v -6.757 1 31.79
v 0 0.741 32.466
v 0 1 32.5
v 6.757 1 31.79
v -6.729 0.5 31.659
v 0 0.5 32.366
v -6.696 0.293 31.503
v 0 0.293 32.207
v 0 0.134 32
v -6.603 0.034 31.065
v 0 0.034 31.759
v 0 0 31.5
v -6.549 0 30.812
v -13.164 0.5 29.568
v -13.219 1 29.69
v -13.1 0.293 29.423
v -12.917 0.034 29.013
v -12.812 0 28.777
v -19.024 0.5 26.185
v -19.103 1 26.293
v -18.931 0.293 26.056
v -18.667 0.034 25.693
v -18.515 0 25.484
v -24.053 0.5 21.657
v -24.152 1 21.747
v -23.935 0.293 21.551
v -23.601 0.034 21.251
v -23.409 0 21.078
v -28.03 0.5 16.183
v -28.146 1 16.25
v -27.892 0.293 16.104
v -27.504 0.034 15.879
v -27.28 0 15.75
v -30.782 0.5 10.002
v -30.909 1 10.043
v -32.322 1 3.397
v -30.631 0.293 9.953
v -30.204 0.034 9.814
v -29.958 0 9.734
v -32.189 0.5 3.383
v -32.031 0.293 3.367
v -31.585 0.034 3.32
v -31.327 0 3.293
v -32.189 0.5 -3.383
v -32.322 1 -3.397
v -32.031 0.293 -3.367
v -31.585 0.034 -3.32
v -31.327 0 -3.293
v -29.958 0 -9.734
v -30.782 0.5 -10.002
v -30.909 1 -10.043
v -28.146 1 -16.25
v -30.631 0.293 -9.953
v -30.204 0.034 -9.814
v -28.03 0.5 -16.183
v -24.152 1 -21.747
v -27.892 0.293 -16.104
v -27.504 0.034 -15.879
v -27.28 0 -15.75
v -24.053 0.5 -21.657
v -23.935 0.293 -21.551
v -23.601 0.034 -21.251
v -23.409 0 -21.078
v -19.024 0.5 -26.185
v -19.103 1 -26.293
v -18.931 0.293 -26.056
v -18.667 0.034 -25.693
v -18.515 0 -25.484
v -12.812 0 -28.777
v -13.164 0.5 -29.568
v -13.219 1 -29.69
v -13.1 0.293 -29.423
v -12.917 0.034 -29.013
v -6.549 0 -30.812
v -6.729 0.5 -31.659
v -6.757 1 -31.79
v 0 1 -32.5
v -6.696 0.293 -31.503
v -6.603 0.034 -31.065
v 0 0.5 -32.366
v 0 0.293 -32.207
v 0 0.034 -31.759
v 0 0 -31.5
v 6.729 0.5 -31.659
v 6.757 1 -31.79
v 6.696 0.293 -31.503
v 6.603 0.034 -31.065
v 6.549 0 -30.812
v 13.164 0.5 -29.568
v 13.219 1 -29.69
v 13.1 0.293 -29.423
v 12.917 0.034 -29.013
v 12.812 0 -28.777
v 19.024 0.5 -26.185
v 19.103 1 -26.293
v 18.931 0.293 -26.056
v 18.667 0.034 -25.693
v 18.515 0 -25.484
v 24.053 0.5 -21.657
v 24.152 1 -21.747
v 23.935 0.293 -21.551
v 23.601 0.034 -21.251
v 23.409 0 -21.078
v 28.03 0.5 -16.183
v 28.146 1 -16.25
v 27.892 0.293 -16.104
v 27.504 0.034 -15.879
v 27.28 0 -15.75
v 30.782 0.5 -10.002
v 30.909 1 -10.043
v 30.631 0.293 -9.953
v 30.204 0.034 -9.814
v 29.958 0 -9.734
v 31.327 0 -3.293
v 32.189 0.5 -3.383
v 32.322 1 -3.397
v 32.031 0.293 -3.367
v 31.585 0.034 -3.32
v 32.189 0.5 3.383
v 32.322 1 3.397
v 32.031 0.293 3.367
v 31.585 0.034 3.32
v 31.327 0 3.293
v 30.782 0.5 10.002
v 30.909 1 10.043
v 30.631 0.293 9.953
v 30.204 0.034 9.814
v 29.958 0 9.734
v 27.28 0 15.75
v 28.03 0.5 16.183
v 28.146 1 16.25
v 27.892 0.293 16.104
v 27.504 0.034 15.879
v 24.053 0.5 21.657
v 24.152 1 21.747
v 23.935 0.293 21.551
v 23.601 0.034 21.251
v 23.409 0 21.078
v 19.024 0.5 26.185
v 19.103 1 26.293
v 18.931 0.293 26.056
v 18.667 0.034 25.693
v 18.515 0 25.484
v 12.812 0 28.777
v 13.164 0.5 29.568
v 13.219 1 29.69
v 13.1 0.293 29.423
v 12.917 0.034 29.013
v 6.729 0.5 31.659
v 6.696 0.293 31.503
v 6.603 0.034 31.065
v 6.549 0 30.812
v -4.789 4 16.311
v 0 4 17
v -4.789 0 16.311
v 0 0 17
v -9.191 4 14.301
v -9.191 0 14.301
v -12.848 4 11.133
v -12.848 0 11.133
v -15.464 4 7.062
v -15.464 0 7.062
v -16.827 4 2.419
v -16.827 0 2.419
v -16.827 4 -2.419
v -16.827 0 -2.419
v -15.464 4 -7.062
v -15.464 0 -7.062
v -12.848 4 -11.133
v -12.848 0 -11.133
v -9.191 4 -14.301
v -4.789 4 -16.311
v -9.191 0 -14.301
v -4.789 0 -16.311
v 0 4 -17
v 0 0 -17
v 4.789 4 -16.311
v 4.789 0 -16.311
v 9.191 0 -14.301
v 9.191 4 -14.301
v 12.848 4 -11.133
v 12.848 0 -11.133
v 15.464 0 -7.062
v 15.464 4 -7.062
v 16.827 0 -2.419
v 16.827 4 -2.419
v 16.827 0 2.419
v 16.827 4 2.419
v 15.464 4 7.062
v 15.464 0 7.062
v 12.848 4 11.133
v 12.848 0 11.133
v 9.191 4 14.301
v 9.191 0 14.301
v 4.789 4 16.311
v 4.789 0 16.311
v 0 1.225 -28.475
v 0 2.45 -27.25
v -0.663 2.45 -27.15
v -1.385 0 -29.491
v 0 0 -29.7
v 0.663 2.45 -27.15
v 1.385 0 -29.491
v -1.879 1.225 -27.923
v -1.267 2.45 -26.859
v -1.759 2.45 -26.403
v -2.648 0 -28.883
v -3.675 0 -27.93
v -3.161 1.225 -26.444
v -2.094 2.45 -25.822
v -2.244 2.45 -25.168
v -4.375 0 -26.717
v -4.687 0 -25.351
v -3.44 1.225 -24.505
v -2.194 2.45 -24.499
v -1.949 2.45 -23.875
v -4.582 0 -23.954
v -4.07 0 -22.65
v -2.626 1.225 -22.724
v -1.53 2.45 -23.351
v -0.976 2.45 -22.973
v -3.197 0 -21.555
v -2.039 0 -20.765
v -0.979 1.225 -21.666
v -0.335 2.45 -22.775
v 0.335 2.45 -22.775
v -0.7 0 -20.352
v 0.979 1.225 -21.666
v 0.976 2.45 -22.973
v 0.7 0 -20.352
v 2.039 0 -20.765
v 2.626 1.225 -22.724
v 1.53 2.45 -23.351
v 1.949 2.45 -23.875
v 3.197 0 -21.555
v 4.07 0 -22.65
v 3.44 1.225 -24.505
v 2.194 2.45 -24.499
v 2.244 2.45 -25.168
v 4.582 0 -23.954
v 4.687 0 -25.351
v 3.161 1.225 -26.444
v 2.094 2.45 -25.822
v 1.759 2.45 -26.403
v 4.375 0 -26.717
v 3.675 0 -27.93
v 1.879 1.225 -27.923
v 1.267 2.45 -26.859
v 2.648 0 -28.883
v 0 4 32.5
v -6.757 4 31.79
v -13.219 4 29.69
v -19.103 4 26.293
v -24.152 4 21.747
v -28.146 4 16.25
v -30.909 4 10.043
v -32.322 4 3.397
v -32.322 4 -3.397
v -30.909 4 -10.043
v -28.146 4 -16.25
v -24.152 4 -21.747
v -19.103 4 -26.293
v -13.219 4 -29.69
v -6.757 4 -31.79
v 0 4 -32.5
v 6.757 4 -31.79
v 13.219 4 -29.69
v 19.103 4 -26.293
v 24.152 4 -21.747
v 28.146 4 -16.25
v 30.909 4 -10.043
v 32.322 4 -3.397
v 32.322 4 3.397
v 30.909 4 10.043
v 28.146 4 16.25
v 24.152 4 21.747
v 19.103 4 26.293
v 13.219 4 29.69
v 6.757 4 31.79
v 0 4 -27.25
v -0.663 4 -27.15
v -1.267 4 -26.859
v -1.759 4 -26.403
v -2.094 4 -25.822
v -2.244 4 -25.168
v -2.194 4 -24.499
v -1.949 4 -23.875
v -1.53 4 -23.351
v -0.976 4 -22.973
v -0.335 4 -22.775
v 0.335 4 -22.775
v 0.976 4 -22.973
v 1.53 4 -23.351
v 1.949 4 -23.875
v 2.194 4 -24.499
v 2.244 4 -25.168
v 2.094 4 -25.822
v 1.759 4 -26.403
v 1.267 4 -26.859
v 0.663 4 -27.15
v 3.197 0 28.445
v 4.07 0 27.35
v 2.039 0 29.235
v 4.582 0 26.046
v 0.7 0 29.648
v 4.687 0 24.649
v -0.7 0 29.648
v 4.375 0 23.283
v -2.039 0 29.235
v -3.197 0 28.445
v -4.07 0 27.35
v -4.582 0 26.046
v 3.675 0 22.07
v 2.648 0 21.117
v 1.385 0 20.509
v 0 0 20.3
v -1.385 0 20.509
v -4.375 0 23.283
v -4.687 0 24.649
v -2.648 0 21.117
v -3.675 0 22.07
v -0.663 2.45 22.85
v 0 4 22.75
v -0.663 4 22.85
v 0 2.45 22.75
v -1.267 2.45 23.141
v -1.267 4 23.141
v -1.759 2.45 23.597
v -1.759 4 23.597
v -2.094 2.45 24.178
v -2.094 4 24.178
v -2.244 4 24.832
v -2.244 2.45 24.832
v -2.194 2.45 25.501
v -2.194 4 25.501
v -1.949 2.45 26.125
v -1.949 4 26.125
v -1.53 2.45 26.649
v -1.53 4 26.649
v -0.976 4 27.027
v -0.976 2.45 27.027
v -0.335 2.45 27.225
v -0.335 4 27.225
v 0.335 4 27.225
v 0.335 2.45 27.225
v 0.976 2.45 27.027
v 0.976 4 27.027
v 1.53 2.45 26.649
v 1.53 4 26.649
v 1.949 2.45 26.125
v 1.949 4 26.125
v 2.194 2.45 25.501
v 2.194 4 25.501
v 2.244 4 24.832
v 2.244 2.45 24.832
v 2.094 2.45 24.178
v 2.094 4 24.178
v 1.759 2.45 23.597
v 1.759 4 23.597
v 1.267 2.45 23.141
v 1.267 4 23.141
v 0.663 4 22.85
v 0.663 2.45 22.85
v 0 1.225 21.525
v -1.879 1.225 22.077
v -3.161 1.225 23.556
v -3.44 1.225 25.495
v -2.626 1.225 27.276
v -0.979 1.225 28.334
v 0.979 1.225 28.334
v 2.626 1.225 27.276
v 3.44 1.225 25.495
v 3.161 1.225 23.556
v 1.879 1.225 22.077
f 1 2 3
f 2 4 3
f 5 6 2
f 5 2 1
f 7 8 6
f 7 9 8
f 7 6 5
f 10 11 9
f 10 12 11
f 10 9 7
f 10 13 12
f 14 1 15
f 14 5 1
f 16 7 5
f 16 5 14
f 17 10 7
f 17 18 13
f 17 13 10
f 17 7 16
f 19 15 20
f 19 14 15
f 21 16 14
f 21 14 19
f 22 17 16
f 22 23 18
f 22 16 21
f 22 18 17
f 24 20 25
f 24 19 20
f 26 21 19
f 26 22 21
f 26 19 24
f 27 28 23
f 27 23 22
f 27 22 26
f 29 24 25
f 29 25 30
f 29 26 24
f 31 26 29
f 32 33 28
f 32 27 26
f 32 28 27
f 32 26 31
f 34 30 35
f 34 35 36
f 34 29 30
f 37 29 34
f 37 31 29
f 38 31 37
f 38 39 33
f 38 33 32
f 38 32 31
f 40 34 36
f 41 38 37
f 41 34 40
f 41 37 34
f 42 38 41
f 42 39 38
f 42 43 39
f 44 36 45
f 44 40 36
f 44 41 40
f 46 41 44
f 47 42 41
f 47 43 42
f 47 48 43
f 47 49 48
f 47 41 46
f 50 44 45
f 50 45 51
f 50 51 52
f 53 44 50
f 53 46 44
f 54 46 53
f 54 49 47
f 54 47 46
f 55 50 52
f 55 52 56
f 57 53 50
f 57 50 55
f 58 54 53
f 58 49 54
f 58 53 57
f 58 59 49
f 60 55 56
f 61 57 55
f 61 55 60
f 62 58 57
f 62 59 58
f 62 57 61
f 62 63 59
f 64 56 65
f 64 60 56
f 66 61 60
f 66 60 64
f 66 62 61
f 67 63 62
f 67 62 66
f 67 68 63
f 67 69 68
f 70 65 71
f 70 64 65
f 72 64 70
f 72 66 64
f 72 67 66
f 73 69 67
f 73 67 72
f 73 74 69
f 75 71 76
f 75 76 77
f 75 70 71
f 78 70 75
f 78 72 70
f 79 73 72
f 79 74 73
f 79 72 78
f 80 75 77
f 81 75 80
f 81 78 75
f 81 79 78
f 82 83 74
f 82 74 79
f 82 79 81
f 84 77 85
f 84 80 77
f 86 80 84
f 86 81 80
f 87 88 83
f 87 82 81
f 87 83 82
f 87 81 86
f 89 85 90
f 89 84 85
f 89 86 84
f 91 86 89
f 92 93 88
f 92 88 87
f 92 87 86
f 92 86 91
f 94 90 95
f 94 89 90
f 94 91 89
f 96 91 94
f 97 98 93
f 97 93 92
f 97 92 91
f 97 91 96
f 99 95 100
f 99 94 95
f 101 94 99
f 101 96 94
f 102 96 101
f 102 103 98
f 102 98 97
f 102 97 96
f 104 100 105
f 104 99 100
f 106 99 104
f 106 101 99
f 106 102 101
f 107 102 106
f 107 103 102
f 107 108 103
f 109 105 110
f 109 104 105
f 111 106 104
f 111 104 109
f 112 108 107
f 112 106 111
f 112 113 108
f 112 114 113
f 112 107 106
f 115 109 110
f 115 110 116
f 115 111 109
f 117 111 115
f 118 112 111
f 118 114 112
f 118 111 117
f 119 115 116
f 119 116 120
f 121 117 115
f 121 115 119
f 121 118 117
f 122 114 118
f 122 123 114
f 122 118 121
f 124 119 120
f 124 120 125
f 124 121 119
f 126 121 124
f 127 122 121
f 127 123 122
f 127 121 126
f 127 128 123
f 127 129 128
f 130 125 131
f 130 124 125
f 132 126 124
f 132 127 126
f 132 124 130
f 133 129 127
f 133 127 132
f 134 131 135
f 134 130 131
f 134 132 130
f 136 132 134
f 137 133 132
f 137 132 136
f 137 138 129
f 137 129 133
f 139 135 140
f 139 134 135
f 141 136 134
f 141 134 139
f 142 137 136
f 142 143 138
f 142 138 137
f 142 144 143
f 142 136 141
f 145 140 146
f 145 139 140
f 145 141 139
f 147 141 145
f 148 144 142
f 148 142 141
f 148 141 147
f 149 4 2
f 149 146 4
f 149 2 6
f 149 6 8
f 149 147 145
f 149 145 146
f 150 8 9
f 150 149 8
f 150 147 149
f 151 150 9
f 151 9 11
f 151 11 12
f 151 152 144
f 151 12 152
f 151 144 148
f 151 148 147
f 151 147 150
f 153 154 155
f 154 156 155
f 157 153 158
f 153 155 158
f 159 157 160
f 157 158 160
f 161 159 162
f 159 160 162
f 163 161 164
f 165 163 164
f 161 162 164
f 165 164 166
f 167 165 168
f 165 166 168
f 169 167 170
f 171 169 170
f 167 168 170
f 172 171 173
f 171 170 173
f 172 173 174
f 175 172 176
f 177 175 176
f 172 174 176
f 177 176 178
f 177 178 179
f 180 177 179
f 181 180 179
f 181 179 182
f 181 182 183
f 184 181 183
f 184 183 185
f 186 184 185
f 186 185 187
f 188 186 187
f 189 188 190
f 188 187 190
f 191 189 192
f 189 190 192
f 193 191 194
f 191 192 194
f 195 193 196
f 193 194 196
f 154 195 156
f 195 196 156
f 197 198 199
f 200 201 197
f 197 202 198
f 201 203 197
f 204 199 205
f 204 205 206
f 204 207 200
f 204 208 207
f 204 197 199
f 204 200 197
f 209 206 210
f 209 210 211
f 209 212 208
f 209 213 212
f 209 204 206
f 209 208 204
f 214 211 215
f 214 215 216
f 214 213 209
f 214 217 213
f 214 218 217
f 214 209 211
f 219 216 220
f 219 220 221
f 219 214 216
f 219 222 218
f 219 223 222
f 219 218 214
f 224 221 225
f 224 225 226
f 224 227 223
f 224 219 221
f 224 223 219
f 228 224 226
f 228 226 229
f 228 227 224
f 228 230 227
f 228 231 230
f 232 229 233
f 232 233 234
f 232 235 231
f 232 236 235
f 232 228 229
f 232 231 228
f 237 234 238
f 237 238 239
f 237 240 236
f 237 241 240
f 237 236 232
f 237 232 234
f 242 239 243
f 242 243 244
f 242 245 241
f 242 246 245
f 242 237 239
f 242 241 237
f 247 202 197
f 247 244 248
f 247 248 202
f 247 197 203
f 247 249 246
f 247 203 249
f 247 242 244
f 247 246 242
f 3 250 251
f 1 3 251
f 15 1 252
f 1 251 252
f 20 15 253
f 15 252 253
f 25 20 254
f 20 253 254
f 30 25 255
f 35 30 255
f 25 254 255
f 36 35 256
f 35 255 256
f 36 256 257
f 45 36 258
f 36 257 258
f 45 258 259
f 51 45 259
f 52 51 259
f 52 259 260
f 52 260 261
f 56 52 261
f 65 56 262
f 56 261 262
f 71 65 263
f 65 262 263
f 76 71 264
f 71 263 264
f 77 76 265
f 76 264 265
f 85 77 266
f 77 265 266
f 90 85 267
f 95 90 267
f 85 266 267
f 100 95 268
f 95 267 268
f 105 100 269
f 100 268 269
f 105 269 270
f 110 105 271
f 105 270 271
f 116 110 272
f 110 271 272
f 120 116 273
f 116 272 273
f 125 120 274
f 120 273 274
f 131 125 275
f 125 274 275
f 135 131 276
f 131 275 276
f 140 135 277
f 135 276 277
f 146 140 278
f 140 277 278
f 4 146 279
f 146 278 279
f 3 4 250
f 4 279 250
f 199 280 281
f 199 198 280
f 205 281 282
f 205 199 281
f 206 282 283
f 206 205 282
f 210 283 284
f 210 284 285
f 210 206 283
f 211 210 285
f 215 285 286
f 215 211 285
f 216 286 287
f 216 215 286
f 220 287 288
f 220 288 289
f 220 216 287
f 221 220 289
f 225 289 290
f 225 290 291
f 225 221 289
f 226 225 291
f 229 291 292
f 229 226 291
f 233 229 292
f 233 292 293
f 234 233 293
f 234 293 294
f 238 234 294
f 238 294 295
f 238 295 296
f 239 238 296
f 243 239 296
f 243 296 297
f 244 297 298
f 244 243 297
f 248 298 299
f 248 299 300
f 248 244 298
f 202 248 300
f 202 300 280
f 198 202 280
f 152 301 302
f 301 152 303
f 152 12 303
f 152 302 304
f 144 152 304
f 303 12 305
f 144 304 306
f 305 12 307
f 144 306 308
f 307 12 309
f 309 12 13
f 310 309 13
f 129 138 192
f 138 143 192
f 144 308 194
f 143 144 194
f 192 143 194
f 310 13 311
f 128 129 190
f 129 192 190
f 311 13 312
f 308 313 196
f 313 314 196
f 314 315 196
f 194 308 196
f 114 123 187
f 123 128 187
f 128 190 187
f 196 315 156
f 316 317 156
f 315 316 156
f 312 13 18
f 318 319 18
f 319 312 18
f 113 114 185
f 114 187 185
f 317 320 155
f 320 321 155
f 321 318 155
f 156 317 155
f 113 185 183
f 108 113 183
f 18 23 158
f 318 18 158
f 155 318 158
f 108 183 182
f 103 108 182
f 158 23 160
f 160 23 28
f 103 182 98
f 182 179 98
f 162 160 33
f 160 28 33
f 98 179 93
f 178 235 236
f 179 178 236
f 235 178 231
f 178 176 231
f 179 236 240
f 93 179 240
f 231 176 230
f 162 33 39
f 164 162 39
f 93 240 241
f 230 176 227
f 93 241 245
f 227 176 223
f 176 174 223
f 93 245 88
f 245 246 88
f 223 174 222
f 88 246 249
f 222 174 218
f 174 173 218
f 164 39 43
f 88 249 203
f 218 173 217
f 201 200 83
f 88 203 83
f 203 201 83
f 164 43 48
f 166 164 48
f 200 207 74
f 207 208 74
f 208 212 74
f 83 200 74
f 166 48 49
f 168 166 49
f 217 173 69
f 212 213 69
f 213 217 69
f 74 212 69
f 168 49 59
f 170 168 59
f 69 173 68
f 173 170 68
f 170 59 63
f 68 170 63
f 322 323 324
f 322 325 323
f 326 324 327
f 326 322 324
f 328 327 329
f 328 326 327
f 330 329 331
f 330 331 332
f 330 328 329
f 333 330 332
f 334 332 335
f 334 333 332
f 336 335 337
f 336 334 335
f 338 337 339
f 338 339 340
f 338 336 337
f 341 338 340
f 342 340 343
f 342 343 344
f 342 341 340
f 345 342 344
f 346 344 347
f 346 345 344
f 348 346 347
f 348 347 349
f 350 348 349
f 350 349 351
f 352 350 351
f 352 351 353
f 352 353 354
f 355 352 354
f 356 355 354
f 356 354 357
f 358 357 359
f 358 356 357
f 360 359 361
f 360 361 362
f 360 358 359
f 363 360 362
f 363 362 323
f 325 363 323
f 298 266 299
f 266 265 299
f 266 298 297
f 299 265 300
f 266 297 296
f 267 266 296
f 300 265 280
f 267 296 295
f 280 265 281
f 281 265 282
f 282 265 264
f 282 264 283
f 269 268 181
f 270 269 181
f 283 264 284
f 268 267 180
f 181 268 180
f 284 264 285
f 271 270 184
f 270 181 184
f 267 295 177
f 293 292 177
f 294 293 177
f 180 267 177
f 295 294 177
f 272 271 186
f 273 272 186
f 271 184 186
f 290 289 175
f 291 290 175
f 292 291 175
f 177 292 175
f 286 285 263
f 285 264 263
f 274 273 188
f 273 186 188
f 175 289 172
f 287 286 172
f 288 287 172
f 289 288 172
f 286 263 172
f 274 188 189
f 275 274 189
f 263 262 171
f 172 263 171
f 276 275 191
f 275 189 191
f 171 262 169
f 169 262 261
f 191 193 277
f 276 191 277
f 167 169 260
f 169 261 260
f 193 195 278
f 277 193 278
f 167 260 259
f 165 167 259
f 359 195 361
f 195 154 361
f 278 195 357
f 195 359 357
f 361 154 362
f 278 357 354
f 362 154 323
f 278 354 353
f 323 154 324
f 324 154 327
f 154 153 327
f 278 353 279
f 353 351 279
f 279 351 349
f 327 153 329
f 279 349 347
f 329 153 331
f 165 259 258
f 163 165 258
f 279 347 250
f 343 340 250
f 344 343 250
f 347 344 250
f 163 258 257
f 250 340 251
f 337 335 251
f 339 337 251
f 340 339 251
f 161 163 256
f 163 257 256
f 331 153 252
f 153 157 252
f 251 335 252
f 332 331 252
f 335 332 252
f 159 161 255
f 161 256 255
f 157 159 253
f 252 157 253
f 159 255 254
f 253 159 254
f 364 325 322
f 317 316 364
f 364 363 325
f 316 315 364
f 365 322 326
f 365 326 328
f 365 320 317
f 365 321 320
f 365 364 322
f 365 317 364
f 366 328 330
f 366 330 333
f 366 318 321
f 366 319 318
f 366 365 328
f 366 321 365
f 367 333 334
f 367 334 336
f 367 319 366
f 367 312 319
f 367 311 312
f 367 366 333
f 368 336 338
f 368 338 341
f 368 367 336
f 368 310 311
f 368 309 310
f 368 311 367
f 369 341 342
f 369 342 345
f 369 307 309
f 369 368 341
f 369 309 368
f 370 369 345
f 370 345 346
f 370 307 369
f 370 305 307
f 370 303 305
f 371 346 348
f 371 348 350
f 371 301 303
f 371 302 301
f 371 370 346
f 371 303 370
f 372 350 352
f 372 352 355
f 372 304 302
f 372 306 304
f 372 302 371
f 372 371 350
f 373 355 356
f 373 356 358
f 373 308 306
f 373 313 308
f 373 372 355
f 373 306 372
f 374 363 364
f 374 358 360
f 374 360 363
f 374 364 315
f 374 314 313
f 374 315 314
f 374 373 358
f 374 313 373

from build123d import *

# Parameters (mm, degrees)
CSK_SLOT_FOR_M4_COUNTERSUNK_FLAT_HEA_2_COUNT = 2
CSK_SLOT_FOR_M4_COUNTERSUNK_FLAT_HEA_2_PITCH = 50
FILLET1_R                                    = 1
CUT_EXTRUDE2_START                           = -10
SKETCH5_R                                    = 17
CUT_EXTRUDE2_DEPTH                           = 10


with BuildPart() as part:
    # Sketch1 → Revolve1 (revolve)
    with BuildSketch(Plane.XY, mode=Mode.PRIVATE) as revolve1_sk:
        Polygon((-32.5, 0), (-32.5, 4), (-17, 4), (-17, 2), (0, 2), (0, 0), align=None)
    revolve(revolve1_sk.sketch.rotate(Axis((0, 0, 0), (0, -1, 0)), 270), axis=Axis((0, 0, 0), (0, -1, 0)))

    # Sketch3 → CSK SLOT for M4 Countersunk Flat Head Screw1 (revolve, cut)
    with BuildSketch(Plane(origin=(0, 0, 25), x_dir=(0, 0, -1), z_dir=(1, 0, 0))):
        Polygon((0, 0), (0, 4), (2.25, 4), (2.25, 2.45), (4.7, 0), align=None)
    csk_slot_for_m4_countersunk_flat_head_sc = revolve(axis=Axis((0, -6.35, 25), (0, 1, 0)), mode=Mode.SUBTRACT)

    # CSK SLOT for M4 Countersunk Flat Hea 2: CSK SLOT for M4 Countersunk Flat Head Screw1 ×2
    with Locations(*[(0, 0, -i * CSK_SLOT_FOR_M4_COUNTERSUNK_FLAT_HEA_2_PITCH) for i in range(1, CSK_SLOT_FOR_M4_COUNTERSUNK_FLAT_HEA_2_COUNT)]):
        add(csk_slot_for_m4_countersunk_flat_head_sc, mode=Mode.SUBTRACT)

    # Fillet1
    fillet1_edges = [part.edges().sort_by_distance(p)[0] for p in [
        (0, 2, -17),
        (0, 0, -32.5),
    ]]
    fillet(fillet1_edges, radius=FILLET1_R)

    # Sketch5 → Cut-Extrude2 (cut)
    with BuildSketch(Plane(origin=(0, 4, 0), x_dir=(1, 0, 0), z_dir=(0, 1, 0)).offset(CUT_EXTRUDE2_START)):
        with Locations(Location((0, 0, 0), (0, 0, 270))):
            Circle(SKETCH5_R)
    extrude(amount=CUT_EXTRUDE2_DEPTH, mode=Mode.SUBTRACT)


solid = part.part
